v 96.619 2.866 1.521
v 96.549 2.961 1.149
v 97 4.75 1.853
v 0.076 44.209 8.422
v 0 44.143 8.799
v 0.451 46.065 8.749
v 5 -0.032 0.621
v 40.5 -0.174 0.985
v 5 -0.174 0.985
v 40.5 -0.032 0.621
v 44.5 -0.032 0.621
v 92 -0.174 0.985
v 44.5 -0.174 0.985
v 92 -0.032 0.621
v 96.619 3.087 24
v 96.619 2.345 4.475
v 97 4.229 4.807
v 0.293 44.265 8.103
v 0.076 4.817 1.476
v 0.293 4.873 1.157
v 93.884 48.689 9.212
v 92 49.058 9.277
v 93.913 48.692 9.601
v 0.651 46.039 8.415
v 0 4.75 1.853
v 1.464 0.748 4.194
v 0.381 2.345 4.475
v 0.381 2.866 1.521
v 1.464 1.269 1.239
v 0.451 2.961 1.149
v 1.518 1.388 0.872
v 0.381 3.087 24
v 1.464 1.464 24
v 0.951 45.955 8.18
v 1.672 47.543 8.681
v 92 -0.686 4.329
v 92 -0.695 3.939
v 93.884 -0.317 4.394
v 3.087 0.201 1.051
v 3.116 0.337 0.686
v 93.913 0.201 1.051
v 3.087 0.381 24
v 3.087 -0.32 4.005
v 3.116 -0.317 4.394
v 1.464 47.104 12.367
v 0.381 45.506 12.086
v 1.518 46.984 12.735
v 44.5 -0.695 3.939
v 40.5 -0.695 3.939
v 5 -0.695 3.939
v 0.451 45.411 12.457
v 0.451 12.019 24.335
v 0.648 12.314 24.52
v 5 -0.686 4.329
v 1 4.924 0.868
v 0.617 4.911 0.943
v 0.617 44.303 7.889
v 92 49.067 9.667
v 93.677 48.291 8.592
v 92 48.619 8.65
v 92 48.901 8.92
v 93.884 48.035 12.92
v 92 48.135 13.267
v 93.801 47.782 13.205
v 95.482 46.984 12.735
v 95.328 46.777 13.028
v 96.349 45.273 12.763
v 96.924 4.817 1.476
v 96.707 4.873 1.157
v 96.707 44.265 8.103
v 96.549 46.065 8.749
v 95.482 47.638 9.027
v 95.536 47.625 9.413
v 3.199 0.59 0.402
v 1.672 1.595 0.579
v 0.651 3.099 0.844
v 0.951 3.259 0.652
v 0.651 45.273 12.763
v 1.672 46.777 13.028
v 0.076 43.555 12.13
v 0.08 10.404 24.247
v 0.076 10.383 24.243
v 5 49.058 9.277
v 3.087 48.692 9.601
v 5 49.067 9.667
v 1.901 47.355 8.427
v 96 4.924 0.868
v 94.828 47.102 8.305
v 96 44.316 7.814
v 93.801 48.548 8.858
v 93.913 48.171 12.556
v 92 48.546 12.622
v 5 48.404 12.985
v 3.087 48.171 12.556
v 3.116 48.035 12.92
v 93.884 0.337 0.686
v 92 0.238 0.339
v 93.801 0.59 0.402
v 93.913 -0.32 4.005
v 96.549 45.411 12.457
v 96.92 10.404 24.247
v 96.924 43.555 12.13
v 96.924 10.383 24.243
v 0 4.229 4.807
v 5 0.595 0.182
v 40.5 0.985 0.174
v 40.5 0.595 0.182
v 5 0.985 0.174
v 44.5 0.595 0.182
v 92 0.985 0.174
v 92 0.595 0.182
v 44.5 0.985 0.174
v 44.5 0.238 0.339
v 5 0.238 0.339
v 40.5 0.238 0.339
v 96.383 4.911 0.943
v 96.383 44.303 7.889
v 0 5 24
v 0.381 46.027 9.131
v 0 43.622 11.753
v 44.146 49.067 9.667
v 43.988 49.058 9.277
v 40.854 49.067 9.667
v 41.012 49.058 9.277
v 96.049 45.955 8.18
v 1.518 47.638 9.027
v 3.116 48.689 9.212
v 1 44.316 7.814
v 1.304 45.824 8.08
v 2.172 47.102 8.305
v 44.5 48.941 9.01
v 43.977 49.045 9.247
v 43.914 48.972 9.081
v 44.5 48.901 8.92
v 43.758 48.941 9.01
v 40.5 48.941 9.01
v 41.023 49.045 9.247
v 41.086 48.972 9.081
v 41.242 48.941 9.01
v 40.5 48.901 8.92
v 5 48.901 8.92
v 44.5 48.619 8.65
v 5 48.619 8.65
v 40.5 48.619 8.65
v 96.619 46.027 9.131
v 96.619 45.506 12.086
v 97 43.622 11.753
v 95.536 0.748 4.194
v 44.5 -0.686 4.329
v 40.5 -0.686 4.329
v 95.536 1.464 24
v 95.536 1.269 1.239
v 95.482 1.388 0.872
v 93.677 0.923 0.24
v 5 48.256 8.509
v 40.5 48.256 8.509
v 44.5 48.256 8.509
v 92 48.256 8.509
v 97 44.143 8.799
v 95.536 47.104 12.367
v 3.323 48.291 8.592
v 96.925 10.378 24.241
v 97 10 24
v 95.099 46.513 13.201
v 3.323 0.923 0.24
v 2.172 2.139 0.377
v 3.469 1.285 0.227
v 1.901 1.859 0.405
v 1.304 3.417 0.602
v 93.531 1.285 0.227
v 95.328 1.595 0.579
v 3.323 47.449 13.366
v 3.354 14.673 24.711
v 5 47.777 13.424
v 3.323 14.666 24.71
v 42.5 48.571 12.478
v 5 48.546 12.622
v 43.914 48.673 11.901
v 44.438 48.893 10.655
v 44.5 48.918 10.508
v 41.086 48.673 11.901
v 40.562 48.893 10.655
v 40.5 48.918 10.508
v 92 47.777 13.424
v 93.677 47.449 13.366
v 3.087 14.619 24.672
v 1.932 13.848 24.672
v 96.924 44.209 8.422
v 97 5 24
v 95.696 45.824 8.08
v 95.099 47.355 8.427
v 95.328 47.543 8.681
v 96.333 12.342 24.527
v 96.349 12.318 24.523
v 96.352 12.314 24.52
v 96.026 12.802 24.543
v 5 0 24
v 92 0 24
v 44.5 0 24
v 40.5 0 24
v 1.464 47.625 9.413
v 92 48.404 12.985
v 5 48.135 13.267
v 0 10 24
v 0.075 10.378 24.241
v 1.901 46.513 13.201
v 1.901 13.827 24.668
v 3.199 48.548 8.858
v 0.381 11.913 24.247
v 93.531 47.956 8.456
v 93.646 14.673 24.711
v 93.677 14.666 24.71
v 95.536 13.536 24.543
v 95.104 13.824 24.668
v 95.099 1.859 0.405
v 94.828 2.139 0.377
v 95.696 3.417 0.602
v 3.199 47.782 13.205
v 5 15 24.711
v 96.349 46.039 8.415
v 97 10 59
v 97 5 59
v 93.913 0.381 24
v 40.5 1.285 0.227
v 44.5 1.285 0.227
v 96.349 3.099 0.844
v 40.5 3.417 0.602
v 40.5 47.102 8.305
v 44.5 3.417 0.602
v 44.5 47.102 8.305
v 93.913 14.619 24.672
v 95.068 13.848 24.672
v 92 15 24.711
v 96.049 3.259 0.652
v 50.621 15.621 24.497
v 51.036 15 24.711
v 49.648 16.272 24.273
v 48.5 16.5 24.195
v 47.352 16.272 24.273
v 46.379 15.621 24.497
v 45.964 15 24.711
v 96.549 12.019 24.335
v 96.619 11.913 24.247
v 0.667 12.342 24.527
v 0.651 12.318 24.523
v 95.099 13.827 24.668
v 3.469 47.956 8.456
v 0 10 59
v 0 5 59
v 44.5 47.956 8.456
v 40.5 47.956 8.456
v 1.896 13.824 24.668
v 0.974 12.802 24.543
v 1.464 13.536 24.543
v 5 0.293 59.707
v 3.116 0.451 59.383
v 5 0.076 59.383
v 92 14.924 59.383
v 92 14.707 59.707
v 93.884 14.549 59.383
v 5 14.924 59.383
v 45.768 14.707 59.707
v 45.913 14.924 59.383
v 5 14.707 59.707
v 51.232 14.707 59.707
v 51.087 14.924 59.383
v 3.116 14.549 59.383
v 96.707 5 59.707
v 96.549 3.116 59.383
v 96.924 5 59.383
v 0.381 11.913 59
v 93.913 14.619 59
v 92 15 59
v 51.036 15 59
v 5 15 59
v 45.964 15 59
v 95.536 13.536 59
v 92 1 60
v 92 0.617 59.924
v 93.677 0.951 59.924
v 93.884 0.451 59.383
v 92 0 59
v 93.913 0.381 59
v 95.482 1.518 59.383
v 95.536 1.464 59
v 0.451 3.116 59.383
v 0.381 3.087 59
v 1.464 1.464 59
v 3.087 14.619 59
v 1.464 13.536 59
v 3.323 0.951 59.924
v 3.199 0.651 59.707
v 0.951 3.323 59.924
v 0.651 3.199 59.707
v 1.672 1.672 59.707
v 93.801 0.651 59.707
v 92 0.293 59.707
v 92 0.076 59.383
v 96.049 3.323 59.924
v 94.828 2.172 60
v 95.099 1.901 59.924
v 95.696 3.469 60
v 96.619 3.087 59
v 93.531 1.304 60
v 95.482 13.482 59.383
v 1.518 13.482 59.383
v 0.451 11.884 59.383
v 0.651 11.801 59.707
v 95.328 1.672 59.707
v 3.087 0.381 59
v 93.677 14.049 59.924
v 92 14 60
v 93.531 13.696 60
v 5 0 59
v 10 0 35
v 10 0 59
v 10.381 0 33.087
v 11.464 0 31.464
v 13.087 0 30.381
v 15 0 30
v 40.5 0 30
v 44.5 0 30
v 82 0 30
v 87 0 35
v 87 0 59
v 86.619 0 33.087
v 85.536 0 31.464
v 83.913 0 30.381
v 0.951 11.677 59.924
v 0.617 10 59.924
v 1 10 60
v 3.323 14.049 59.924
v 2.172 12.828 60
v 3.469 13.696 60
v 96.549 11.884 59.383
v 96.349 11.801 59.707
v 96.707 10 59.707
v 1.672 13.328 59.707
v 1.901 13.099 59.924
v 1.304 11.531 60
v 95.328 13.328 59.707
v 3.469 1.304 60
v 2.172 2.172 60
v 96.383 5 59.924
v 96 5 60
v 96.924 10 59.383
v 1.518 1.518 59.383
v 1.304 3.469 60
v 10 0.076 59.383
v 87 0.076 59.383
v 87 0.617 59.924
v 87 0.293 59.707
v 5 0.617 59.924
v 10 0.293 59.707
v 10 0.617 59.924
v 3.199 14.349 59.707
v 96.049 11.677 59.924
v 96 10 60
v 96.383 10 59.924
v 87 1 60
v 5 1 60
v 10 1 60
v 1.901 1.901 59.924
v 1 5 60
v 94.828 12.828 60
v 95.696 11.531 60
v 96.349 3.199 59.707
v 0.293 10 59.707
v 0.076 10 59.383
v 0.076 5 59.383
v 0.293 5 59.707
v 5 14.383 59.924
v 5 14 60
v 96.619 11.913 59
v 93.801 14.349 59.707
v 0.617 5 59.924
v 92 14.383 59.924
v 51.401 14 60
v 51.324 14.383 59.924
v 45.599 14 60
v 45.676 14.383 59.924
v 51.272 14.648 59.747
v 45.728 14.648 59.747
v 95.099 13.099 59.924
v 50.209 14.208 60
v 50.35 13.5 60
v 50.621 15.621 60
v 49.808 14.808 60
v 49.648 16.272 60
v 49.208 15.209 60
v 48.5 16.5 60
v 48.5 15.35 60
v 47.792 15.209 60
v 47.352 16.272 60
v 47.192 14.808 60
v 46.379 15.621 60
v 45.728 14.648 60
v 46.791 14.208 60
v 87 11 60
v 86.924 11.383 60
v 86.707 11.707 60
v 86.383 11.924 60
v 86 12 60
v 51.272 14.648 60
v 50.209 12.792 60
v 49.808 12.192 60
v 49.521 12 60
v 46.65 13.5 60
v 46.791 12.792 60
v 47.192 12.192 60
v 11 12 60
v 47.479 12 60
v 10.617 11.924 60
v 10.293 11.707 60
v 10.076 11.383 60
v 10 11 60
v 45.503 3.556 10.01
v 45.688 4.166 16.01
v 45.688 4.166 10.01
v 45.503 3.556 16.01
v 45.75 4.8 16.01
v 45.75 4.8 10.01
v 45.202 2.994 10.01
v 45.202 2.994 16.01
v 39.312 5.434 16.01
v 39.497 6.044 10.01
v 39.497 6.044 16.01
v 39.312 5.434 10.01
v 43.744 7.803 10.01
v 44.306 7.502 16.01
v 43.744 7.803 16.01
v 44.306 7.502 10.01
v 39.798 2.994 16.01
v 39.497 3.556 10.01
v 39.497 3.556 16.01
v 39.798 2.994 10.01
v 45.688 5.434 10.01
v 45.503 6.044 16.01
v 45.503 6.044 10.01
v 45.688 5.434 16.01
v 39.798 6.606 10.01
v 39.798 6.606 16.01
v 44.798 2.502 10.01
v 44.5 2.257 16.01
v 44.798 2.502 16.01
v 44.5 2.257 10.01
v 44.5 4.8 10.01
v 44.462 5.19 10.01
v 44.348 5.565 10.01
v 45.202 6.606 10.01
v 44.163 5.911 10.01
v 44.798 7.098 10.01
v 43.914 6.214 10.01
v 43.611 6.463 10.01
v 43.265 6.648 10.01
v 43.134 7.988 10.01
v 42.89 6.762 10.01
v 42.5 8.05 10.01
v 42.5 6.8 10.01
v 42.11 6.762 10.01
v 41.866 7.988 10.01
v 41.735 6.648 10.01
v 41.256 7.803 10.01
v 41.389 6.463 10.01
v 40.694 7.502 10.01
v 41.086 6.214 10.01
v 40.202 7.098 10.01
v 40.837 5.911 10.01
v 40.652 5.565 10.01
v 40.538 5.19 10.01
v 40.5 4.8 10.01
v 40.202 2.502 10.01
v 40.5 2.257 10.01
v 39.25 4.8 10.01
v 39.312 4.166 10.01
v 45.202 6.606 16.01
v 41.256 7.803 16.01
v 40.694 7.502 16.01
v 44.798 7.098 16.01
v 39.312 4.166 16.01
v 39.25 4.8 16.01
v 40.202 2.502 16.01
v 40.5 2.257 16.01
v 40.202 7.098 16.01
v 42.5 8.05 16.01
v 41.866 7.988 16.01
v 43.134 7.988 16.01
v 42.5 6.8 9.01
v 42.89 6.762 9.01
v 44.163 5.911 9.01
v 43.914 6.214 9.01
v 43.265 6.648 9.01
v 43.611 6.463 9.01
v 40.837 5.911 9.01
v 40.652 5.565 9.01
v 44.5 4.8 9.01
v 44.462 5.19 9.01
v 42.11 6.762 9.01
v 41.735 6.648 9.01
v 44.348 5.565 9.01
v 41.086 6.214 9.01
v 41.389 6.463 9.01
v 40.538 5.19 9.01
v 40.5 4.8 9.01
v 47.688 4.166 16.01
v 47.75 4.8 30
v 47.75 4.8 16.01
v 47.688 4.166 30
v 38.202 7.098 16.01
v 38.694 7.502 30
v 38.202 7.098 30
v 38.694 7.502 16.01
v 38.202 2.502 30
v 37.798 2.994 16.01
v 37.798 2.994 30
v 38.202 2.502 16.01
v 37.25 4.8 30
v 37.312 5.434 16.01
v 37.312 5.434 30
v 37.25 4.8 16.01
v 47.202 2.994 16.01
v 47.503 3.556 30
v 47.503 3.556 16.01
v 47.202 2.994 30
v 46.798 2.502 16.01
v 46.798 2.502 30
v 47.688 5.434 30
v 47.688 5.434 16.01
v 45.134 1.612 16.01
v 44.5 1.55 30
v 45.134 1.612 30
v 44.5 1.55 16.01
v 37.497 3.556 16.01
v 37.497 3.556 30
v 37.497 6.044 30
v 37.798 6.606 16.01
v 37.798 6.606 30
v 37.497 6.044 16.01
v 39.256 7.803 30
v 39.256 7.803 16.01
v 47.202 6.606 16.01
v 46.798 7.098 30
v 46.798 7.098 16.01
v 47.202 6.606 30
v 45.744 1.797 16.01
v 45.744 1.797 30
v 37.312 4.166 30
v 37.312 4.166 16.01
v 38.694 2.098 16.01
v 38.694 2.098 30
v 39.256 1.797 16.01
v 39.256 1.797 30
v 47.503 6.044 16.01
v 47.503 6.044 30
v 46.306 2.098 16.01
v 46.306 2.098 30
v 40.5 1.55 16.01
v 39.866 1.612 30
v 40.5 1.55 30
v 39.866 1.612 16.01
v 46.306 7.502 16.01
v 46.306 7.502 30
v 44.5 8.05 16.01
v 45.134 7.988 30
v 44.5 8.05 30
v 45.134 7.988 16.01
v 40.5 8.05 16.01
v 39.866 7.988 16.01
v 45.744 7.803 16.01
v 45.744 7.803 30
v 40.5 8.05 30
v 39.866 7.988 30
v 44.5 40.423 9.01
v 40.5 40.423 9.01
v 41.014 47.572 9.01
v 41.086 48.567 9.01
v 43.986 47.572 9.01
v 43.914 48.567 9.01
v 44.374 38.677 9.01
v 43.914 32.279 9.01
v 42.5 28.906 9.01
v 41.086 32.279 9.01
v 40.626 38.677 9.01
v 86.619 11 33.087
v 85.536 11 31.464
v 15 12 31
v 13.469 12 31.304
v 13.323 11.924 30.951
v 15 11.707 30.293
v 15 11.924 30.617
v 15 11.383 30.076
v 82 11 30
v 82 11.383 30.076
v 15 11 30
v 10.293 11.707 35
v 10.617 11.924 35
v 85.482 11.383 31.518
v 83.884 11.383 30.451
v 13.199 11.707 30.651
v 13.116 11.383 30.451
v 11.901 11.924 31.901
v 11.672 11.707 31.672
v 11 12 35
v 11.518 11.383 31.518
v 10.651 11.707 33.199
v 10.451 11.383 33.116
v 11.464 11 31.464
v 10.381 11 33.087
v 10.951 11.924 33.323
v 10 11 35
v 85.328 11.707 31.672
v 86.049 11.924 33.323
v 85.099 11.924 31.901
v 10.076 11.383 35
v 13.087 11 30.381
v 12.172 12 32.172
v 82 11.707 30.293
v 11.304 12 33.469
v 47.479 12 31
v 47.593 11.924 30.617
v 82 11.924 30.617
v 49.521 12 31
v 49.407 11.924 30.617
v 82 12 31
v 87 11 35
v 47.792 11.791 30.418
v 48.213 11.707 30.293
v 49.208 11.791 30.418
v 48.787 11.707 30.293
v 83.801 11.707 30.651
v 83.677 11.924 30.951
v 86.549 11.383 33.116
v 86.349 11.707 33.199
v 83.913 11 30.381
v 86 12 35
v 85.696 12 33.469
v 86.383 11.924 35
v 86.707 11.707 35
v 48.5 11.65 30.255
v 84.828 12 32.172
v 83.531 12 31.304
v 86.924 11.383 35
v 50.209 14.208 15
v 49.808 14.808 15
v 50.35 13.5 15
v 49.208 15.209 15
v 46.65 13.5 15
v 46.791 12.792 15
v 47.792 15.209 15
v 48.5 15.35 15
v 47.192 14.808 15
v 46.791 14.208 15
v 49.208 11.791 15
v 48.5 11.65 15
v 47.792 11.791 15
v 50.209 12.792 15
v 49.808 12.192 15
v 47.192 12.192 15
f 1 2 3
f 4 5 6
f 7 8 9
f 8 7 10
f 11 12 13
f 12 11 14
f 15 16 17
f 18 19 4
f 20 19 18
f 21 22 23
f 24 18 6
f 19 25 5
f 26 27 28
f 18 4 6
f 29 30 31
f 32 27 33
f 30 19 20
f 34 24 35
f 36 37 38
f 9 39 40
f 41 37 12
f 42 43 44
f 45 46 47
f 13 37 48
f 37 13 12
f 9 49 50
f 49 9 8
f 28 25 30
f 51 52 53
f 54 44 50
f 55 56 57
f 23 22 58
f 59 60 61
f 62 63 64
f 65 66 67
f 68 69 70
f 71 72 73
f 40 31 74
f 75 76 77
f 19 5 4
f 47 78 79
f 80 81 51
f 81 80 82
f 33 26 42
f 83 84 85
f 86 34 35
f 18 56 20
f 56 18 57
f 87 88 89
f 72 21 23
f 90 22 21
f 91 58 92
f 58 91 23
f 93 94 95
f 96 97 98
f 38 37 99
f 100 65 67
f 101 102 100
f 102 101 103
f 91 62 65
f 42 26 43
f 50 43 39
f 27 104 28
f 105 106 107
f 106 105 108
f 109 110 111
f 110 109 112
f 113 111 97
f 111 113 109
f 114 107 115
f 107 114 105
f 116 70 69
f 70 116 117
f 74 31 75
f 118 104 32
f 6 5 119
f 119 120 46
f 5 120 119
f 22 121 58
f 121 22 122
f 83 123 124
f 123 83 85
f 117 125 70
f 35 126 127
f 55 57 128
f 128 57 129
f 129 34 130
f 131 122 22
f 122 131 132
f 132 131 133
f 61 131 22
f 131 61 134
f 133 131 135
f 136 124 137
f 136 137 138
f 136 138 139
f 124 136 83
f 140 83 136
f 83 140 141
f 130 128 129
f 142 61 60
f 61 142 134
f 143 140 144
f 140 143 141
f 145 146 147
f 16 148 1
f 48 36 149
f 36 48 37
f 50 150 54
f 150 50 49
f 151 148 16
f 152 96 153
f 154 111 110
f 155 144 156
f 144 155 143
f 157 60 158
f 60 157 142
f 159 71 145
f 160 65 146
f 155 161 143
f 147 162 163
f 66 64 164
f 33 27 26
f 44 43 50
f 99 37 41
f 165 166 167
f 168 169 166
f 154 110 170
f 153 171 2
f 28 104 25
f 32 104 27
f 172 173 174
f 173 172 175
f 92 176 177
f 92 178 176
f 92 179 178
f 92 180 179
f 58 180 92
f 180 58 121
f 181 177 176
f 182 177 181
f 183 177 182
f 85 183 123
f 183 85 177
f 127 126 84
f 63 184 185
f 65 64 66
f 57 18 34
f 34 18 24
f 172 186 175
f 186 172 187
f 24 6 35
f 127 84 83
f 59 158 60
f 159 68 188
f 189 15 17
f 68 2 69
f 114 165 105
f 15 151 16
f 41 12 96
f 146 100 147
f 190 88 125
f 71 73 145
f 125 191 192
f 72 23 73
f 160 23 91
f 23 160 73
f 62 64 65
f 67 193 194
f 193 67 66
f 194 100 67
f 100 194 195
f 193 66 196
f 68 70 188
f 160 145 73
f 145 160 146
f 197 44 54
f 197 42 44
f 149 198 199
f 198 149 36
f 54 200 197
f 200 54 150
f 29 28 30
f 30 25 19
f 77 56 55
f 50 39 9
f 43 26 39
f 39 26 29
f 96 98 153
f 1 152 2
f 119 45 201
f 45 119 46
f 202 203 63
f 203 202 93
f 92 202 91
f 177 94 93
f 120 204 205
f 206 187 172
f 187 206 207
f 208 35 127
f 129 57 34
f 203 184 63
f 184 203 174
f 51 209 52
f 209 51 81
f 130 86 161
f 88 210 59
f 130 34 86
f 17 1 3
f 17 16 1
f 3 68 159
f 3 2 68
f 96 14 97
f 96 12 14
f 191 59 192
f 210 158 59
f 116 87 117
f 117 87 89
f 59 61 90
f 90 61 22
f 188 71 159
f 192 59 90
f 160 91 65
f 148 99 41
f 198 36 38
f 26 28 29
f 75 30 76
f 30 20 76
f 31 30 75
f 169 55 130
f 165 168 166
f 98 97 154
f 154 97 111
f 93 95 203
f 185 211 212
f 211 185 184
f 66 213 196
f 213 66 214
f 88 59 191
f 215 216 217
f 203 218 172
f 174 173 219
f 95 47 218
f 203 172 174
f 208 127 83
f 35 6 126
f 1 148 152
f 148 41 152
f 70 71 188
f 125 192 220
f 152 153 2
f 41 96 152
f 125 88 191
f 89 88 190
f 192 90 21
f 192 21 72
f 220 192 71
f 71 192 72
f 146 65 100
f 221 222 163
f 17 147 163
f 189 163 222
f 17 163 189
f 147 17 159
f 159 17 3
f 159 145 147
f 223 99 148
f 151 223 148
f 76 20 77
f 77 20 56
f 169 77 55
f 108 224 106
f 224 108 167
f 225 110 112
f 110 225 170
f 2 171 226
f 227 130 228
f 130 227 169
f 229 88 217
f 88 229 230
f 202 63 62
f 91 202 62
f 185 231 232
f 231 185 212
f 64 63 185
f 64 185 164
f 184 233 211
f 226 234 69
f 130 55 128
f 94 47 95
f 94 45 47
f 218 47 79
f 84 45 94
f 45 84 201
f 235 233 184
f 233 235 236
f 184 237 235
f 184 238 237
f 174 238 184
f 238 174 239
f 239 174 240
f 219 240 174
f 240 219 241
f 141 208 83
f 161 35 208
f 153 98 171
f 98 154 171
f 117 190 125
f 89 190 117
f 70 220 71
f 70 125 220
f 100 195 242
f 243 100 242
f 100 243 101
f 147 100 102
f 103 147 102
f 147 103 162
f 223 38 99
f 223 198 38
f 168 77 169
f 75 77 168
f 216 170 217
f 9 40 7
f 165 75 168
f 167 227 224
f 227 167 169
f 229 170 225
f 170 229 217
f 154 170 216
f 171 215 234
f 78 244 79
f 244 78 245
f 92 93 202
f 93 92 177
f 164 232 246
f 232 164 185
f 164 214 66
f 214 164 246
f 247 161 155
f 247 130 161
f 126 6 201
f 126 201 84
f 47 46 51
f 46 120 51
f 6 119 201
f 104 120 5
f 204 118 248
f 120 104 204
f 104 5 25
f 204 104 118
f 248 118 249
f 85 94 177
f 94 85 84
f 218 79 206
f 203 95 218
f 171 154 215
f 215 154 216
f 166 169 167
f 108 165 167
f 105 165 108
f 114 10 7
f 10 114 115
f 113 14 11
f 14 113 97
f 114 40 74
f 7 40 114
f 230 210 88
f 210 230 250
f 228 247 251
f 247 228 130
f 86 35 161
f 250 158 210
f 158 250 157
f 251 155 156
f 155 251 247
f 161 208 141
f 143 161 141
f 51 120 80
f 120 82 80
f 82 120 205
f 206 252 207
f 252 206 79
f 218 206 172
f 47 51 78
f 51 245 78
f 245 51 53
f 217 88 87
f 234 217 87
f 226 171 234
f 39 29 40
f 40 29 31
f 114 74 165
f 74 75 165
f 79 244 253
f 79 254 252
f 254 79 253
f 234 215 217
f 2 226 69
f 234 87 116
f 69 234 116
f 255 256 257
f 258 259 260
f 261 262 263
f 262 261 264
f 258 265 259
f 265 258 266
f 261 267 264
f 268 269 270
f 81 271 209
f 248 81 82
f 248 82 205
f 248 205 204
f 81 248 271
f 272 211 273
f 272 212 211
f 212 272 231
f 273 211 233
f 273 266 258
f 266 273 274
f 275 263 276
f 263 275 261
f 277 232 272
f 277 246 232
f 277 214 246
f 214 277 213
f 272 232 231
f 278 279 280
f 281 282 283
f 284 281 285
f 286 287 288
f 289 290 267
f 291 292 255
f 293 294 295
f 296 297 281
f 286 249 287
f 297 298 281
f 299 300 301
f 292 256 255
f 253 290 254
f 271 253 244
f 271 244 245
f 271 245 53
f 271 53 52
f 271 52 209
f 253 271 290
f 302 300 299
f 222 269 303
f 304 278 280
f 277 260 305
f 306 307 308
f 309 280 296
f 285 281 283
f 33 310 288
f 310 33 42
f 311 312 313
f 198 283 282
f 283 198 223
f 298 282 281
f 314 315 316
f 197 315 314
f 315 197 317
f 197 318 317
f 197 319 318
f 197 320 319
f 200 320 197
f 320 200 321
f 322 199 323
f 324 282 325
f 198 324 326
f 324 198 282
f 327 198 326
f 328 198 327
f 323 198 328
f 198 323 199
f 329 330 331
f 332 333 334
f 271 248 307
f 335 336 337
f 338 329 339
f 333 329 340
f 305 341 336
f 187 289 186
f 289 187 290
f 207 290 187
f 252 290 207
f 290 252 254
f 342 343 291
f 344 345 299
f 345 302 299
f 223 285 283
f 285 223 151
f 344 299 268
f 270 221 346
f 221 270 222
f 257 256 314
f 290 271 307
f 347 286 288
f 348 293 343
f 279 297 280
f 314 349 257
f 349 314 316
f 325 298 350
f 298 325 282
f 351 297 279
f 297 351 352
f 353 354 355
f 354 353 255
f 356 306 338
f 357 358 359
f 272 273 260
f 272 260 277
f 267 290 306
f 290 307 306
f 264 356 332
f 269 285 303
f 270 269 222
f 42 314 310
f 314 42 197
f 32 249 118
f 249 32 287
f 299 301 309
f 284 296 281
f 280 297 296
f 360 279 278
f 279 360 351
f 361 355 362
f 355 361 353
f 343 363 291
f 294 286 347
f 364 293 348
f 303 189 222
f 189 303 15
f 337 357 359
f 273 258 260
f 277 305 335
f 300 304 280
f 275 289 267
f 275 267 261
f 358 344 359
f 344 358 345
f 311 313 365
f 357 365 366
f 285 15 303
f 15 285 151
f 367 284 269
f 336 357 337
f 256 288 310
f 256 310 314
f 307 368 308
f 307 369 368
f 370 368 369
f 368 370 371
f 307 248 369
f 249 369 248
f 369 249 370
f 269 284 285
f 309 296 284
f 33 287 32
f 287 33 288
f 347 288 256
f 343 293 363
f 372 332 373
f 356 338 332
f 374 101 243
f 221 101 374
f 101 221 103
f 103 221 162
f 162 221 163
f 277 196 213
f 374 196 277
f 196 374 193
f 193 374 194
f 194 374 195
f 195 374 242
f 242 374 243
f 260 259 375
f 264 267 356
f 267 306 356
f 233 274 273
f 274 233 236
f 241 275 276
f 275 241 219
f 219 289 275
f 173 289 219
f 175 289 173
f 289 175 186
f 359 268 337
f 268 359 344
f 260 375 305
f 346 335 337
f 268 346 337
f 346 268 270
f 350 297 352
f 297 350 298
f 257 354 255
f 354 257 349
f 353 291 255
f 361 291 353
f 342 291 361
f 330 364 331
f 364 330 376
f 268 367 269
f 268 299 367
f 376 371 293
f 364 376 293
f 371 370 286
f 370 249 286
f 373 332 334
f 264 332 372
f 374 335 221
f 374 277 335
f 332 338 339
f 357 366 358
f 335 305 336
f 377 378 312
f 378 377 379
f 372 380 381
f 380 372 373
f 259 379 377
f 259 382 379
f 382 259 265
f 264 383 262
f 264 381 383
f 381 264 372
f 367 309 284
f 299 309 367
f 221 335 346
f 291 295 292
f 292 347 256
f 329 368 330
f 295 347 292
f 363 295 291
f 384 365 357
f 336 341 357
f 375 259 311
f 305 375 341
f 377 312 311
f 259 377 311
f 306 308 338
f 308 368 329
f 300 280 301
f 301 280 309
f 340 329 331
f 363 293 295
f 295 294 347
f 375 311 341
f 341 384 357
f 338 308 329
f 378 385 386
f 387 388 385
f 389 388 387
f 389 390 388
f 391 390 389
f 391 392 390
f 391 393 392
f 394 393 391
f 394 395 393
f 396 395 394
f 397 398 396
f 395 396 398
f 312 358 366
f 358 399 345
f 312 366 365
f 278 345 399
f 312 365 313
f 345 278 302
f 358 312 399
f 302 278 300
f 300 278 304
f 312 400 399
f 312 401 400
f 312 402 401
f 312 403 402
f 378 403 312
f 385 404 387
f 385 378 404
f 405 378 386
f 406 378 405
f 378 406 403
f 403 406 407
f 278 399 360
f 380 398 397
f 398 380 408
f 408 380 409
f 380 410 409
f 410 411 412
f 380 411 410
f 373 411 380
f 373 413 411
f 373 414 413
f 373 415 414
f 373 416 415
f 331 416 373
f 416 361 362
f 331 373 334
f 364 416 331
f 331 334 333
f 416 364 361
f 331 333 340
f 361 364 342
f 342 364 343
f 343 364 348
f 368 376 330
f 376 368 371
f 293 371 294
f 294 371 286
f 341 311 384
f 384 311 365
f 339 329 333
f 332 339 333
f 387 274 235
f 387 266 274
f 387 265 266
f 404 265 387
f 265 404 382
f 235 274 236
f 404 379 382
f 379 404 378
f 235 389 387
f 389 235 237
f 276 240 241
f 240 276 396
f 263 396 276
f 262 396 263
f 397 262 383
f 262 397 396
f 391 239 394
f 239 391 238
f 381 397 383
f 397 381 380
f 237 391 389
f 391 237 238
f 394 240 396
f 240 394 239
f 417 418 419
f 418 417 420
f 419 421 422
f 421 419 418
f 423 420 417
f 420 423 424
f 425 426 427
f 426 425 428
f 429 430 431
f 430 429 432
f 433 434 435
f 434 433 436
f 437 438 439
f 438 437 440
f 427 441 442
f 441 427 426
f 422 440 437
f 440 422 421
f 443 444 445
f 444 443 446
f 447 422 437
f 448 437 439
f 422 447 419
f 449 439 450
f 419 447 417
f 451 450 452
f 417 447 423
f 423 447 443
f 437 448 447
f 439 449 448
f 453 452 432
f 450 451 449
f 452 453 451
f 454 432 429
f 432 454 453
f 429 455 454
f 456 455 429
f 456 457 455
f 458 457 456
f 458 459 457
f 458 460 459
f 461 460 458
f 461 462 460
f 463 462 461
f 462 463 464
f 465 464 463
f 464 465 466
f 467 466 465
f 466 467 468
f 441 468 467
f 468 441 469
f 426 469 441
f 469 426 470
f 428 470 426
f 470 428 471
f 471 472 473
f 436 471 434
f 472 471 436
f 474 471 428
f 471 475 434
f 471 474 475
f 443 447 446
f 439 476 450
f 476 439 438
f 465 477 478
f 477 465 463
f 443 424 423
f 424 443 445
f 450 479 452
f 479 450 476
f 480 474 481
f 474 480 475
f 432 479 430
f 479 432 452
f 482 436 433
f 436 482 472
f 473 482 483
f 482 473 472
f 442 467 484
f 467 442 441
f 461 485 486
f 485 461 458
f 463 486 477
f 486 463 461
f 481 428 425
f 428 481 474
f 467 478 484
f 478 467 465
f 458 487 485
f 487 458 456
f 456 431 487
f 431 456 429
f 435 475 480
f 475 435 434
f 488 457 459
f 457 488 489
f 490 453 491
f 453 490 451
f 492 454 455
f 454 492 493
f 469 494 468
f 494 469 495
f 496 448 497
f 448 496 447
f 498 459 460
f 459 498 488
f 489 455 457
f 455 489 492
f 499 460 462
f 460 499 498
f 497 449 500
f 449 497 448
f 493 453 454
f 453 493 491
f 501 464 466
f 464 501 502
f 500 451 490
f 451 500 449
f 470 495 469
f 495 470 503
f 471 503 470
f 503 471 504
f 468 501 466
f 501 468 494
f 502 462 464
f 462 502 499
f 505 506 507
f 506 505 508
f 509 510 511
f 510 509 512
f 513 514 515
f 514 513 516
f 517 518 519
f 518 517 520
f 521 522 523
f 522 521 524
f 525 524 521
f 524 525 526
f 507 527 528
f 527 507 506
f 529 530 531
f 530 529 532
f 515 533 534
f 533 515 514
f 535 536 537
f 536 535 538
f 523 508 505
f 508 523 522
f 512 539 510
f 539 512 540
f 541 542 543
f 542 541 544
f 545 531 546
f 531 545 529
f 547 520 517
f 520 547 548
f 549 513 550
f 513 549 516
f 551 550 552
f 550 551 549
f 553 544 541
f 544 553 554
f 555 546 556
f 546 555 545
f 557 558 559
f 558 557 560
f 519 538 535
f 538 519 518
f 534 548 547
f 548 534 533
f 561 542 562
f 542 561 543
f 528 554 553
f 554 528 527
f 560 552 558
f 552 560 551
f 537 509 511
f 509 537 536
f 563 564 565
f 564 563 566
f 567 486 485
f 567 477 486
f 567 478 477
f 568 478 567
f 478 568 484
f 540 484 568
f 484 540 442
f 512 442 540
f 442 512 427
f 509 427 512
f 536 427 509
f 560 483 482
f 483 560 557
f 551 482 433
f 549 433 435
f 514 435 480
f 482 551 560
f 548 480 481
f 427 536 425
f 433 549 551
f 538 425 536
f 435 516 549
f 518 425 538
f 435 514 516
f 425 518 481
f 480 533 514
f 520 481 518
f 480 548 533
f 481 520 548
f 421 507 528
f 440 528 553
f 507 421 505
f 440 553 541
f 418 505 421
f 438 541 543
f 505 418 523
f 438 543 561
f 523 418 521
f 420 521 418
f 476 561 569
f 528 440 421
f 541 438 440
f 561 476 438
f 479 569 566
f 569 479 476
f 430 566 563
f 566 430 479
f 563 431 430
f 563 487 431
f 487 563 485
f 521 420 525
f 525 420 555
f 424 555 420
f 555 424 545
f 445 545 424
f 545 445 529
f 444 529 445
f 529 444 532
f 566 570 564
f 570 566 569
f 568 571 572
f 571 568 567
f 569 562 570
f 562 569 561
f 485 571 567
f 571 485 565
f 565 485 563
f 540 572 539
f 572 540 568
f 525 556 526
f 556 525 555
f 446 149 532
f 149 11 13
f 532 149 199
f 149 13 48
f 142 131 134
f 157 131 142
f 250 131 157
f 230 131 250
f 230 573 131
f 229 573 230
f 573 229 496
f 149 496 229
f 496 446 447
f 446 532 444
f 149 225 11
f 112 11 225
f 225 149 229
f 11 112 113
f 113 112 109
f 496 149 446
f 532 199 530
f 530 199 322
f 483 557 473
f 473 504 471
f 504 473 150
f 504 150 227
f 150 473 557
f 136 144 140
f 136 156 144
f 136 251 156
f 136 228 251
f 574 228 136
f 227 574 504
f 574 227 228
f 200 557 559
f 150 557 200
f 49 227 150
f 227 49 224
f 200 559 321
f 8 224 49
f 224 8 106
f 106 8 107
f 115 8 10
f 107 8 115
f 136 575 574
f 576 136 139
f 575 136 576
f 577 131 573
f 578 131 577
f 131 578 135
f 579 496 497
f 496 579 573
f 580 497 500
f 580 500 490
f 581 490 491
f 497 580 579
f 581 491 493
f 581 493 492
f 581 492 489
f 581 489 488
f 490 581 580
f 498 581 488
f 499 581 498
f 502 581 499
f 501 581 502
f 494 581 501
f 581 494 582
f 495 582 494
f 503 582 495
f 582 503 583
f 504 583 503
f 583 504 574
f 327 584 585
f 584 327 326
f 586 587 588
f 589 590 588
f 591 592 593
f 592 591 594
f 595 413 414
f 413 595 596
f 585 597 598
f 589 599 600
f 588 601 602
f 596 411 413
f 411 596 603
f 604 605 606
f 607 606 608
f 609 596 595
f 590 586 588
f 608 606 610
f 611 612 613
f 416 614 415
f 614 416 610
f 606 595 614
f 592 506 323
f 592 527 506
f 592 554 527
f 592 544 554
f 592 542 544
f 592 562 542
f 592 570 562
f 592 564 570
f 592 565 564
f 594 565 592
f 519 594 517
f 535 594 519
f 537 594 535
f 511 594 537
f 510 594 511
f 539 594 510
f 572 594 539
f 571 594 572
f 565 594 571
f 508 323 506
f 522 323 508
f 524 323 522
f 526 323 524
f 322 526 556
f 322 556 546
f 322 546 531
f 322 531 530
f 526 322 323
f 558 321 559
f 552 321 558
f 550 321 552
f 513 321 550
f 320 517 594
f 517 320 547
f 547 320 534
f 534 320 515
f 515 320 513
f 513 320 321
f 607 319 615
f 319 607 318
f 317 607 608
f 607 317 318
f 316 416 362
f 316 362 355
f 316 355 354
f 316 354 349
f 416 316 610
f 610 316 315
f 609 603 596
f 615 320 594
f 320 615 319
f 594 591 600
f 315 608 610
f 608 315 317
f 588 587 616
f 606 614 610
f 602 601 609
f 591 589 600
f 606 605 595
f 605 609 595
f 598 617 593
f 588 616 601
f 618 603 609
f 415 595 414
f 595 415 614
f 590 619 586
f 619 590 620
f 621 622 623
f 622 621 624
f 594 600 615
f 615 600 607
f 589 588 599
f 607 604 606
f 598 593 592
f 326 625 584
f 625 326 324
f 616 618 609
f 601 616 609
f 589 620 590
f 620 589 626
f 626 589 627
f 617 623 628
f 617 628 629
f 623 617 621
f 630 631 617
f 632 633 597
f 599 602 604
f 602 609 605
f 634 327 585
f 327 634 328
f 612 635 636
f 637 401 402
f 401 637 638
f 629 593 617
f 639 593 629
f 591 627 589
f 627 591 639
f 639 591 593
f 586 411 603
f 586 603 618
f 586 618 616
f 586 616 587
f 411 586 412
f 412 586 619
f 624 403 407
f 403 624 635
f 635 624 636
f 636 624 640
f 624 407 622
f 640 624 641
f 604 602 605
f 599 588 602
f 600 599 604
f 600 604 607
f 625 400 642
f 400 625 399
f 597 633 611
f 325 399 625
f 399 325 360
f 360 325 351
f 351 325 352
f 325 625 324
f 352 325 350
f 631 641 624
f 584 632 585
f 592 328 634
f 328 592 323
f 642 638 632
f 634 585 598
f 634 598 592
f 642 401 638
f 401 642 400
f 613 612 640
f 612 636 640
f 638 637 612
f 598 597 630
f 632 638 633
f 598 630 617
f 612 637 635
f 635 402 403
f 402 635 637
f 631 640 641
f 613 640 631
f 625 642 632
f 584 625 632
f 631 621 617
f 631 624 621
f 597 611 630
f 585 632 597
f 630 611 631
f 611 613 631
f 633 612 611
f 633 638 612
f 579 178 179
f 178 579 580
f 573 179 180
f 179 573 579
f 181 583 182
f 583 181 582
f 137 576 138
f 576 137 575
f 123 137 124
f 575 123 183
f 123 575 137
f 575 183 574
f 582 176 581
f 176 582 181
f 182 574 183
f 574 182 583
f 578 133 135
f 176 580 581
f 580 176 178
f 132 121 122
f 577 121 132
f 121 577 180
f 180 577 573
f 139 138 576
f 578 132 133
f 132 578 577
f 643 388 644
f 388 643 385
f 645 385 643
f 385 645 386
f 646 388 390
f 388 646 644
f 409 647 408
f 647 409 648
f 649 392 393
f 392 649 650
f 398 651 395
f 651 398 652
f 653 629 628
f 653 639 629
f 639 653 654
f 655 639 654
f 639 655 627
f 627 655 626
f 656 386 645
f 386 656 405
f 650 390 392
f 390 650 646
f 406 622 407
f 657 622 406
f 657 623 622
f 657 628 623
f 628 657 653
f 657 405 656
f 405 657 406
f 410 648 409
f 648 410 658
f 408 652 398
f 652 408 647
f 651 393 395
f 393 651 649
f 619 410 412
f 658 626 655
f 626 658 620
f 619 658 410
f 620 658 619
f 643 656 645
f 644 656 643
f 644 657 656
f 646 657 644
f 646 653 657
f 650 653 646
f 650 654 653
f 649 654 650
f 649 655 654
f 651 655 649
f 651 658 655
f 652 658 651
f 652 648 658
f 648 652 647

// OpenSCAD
module torus() {
    rotate_extrude() {
        translate([4,0])
            circle(r=1, $fn=16);
    }
}
module roundedbox(w,h,d){
    // torus has r=5 h=2
    tr = 5;
    trh = 1;
    hull(){        
        translate([  tr,  tr,  trh])torus();
        translate([w-tr,  tr,  trh])torus();
        translate([w-tr,h-tr,  trh])torus();
        translate([  tr,h-tr,  trh])torus();
        translate([  tr,  tr,d-trh])torus();
        translate([w-tr,  tr,d-trh])torus();
        translate([w-tr,h-tr,d-trh])torus();
        translate([  tr,h-tr,d-trh])torus();
    }
}
module phone(){
    roundedbox(    w=77,    d=/*13.8*/25,    h=160);
}

module chargecable()    //offset 29%36=32.5
{
    translate([32.5,0.01,7.2])
    {
        rotate([90,0,0])
        {
        color("white") cylinder(d=6.5,h=20, $fn=32);
        color("white") cylinder(d=4,h=24, $fn=32);
        color("gray") hull()
            {
                translate([-2,0]) cylinder(h=14, d=6.5, $fn=32);
                translate([ 2,0]) cylinder(h=14, d=6.5, $fn=32);
            }
            
        }
    }
    
}

difference() {
    union() {
        hull() {
            rotate([10,0])roundedbox(97,50,5);
            translate([0,0,10])
             roundedbox(97,15,15);
        }
        translate([0,0,10])
            roundedbox(97,15,50);
        
        translate([97/2, 13.5, 10])
            cylinder(d=6, h=50, $fn=16);
    }
    translate([10,12,30])
    {
        rotate([90,0,0])
        {
            phone();
            chargecable();
            translate([32.5,0.01,7.2]){
                translate([0,-30,15])
                    cube([4,60,30], center=true);
                
                translate([0,-35,0])
                    cube([4,28,95], center=true);
            }
                            
        }
        
        translate([32.5,0.01,-26])
        rotate([100,0,0])
            cylinder(d=4, h=95, center=true, $fn=8);
        
           
    }
        

    translate([97/2, 13.5, 15])
            cylinder(d=3.7, h=70, $fn=16);
}
//*/
